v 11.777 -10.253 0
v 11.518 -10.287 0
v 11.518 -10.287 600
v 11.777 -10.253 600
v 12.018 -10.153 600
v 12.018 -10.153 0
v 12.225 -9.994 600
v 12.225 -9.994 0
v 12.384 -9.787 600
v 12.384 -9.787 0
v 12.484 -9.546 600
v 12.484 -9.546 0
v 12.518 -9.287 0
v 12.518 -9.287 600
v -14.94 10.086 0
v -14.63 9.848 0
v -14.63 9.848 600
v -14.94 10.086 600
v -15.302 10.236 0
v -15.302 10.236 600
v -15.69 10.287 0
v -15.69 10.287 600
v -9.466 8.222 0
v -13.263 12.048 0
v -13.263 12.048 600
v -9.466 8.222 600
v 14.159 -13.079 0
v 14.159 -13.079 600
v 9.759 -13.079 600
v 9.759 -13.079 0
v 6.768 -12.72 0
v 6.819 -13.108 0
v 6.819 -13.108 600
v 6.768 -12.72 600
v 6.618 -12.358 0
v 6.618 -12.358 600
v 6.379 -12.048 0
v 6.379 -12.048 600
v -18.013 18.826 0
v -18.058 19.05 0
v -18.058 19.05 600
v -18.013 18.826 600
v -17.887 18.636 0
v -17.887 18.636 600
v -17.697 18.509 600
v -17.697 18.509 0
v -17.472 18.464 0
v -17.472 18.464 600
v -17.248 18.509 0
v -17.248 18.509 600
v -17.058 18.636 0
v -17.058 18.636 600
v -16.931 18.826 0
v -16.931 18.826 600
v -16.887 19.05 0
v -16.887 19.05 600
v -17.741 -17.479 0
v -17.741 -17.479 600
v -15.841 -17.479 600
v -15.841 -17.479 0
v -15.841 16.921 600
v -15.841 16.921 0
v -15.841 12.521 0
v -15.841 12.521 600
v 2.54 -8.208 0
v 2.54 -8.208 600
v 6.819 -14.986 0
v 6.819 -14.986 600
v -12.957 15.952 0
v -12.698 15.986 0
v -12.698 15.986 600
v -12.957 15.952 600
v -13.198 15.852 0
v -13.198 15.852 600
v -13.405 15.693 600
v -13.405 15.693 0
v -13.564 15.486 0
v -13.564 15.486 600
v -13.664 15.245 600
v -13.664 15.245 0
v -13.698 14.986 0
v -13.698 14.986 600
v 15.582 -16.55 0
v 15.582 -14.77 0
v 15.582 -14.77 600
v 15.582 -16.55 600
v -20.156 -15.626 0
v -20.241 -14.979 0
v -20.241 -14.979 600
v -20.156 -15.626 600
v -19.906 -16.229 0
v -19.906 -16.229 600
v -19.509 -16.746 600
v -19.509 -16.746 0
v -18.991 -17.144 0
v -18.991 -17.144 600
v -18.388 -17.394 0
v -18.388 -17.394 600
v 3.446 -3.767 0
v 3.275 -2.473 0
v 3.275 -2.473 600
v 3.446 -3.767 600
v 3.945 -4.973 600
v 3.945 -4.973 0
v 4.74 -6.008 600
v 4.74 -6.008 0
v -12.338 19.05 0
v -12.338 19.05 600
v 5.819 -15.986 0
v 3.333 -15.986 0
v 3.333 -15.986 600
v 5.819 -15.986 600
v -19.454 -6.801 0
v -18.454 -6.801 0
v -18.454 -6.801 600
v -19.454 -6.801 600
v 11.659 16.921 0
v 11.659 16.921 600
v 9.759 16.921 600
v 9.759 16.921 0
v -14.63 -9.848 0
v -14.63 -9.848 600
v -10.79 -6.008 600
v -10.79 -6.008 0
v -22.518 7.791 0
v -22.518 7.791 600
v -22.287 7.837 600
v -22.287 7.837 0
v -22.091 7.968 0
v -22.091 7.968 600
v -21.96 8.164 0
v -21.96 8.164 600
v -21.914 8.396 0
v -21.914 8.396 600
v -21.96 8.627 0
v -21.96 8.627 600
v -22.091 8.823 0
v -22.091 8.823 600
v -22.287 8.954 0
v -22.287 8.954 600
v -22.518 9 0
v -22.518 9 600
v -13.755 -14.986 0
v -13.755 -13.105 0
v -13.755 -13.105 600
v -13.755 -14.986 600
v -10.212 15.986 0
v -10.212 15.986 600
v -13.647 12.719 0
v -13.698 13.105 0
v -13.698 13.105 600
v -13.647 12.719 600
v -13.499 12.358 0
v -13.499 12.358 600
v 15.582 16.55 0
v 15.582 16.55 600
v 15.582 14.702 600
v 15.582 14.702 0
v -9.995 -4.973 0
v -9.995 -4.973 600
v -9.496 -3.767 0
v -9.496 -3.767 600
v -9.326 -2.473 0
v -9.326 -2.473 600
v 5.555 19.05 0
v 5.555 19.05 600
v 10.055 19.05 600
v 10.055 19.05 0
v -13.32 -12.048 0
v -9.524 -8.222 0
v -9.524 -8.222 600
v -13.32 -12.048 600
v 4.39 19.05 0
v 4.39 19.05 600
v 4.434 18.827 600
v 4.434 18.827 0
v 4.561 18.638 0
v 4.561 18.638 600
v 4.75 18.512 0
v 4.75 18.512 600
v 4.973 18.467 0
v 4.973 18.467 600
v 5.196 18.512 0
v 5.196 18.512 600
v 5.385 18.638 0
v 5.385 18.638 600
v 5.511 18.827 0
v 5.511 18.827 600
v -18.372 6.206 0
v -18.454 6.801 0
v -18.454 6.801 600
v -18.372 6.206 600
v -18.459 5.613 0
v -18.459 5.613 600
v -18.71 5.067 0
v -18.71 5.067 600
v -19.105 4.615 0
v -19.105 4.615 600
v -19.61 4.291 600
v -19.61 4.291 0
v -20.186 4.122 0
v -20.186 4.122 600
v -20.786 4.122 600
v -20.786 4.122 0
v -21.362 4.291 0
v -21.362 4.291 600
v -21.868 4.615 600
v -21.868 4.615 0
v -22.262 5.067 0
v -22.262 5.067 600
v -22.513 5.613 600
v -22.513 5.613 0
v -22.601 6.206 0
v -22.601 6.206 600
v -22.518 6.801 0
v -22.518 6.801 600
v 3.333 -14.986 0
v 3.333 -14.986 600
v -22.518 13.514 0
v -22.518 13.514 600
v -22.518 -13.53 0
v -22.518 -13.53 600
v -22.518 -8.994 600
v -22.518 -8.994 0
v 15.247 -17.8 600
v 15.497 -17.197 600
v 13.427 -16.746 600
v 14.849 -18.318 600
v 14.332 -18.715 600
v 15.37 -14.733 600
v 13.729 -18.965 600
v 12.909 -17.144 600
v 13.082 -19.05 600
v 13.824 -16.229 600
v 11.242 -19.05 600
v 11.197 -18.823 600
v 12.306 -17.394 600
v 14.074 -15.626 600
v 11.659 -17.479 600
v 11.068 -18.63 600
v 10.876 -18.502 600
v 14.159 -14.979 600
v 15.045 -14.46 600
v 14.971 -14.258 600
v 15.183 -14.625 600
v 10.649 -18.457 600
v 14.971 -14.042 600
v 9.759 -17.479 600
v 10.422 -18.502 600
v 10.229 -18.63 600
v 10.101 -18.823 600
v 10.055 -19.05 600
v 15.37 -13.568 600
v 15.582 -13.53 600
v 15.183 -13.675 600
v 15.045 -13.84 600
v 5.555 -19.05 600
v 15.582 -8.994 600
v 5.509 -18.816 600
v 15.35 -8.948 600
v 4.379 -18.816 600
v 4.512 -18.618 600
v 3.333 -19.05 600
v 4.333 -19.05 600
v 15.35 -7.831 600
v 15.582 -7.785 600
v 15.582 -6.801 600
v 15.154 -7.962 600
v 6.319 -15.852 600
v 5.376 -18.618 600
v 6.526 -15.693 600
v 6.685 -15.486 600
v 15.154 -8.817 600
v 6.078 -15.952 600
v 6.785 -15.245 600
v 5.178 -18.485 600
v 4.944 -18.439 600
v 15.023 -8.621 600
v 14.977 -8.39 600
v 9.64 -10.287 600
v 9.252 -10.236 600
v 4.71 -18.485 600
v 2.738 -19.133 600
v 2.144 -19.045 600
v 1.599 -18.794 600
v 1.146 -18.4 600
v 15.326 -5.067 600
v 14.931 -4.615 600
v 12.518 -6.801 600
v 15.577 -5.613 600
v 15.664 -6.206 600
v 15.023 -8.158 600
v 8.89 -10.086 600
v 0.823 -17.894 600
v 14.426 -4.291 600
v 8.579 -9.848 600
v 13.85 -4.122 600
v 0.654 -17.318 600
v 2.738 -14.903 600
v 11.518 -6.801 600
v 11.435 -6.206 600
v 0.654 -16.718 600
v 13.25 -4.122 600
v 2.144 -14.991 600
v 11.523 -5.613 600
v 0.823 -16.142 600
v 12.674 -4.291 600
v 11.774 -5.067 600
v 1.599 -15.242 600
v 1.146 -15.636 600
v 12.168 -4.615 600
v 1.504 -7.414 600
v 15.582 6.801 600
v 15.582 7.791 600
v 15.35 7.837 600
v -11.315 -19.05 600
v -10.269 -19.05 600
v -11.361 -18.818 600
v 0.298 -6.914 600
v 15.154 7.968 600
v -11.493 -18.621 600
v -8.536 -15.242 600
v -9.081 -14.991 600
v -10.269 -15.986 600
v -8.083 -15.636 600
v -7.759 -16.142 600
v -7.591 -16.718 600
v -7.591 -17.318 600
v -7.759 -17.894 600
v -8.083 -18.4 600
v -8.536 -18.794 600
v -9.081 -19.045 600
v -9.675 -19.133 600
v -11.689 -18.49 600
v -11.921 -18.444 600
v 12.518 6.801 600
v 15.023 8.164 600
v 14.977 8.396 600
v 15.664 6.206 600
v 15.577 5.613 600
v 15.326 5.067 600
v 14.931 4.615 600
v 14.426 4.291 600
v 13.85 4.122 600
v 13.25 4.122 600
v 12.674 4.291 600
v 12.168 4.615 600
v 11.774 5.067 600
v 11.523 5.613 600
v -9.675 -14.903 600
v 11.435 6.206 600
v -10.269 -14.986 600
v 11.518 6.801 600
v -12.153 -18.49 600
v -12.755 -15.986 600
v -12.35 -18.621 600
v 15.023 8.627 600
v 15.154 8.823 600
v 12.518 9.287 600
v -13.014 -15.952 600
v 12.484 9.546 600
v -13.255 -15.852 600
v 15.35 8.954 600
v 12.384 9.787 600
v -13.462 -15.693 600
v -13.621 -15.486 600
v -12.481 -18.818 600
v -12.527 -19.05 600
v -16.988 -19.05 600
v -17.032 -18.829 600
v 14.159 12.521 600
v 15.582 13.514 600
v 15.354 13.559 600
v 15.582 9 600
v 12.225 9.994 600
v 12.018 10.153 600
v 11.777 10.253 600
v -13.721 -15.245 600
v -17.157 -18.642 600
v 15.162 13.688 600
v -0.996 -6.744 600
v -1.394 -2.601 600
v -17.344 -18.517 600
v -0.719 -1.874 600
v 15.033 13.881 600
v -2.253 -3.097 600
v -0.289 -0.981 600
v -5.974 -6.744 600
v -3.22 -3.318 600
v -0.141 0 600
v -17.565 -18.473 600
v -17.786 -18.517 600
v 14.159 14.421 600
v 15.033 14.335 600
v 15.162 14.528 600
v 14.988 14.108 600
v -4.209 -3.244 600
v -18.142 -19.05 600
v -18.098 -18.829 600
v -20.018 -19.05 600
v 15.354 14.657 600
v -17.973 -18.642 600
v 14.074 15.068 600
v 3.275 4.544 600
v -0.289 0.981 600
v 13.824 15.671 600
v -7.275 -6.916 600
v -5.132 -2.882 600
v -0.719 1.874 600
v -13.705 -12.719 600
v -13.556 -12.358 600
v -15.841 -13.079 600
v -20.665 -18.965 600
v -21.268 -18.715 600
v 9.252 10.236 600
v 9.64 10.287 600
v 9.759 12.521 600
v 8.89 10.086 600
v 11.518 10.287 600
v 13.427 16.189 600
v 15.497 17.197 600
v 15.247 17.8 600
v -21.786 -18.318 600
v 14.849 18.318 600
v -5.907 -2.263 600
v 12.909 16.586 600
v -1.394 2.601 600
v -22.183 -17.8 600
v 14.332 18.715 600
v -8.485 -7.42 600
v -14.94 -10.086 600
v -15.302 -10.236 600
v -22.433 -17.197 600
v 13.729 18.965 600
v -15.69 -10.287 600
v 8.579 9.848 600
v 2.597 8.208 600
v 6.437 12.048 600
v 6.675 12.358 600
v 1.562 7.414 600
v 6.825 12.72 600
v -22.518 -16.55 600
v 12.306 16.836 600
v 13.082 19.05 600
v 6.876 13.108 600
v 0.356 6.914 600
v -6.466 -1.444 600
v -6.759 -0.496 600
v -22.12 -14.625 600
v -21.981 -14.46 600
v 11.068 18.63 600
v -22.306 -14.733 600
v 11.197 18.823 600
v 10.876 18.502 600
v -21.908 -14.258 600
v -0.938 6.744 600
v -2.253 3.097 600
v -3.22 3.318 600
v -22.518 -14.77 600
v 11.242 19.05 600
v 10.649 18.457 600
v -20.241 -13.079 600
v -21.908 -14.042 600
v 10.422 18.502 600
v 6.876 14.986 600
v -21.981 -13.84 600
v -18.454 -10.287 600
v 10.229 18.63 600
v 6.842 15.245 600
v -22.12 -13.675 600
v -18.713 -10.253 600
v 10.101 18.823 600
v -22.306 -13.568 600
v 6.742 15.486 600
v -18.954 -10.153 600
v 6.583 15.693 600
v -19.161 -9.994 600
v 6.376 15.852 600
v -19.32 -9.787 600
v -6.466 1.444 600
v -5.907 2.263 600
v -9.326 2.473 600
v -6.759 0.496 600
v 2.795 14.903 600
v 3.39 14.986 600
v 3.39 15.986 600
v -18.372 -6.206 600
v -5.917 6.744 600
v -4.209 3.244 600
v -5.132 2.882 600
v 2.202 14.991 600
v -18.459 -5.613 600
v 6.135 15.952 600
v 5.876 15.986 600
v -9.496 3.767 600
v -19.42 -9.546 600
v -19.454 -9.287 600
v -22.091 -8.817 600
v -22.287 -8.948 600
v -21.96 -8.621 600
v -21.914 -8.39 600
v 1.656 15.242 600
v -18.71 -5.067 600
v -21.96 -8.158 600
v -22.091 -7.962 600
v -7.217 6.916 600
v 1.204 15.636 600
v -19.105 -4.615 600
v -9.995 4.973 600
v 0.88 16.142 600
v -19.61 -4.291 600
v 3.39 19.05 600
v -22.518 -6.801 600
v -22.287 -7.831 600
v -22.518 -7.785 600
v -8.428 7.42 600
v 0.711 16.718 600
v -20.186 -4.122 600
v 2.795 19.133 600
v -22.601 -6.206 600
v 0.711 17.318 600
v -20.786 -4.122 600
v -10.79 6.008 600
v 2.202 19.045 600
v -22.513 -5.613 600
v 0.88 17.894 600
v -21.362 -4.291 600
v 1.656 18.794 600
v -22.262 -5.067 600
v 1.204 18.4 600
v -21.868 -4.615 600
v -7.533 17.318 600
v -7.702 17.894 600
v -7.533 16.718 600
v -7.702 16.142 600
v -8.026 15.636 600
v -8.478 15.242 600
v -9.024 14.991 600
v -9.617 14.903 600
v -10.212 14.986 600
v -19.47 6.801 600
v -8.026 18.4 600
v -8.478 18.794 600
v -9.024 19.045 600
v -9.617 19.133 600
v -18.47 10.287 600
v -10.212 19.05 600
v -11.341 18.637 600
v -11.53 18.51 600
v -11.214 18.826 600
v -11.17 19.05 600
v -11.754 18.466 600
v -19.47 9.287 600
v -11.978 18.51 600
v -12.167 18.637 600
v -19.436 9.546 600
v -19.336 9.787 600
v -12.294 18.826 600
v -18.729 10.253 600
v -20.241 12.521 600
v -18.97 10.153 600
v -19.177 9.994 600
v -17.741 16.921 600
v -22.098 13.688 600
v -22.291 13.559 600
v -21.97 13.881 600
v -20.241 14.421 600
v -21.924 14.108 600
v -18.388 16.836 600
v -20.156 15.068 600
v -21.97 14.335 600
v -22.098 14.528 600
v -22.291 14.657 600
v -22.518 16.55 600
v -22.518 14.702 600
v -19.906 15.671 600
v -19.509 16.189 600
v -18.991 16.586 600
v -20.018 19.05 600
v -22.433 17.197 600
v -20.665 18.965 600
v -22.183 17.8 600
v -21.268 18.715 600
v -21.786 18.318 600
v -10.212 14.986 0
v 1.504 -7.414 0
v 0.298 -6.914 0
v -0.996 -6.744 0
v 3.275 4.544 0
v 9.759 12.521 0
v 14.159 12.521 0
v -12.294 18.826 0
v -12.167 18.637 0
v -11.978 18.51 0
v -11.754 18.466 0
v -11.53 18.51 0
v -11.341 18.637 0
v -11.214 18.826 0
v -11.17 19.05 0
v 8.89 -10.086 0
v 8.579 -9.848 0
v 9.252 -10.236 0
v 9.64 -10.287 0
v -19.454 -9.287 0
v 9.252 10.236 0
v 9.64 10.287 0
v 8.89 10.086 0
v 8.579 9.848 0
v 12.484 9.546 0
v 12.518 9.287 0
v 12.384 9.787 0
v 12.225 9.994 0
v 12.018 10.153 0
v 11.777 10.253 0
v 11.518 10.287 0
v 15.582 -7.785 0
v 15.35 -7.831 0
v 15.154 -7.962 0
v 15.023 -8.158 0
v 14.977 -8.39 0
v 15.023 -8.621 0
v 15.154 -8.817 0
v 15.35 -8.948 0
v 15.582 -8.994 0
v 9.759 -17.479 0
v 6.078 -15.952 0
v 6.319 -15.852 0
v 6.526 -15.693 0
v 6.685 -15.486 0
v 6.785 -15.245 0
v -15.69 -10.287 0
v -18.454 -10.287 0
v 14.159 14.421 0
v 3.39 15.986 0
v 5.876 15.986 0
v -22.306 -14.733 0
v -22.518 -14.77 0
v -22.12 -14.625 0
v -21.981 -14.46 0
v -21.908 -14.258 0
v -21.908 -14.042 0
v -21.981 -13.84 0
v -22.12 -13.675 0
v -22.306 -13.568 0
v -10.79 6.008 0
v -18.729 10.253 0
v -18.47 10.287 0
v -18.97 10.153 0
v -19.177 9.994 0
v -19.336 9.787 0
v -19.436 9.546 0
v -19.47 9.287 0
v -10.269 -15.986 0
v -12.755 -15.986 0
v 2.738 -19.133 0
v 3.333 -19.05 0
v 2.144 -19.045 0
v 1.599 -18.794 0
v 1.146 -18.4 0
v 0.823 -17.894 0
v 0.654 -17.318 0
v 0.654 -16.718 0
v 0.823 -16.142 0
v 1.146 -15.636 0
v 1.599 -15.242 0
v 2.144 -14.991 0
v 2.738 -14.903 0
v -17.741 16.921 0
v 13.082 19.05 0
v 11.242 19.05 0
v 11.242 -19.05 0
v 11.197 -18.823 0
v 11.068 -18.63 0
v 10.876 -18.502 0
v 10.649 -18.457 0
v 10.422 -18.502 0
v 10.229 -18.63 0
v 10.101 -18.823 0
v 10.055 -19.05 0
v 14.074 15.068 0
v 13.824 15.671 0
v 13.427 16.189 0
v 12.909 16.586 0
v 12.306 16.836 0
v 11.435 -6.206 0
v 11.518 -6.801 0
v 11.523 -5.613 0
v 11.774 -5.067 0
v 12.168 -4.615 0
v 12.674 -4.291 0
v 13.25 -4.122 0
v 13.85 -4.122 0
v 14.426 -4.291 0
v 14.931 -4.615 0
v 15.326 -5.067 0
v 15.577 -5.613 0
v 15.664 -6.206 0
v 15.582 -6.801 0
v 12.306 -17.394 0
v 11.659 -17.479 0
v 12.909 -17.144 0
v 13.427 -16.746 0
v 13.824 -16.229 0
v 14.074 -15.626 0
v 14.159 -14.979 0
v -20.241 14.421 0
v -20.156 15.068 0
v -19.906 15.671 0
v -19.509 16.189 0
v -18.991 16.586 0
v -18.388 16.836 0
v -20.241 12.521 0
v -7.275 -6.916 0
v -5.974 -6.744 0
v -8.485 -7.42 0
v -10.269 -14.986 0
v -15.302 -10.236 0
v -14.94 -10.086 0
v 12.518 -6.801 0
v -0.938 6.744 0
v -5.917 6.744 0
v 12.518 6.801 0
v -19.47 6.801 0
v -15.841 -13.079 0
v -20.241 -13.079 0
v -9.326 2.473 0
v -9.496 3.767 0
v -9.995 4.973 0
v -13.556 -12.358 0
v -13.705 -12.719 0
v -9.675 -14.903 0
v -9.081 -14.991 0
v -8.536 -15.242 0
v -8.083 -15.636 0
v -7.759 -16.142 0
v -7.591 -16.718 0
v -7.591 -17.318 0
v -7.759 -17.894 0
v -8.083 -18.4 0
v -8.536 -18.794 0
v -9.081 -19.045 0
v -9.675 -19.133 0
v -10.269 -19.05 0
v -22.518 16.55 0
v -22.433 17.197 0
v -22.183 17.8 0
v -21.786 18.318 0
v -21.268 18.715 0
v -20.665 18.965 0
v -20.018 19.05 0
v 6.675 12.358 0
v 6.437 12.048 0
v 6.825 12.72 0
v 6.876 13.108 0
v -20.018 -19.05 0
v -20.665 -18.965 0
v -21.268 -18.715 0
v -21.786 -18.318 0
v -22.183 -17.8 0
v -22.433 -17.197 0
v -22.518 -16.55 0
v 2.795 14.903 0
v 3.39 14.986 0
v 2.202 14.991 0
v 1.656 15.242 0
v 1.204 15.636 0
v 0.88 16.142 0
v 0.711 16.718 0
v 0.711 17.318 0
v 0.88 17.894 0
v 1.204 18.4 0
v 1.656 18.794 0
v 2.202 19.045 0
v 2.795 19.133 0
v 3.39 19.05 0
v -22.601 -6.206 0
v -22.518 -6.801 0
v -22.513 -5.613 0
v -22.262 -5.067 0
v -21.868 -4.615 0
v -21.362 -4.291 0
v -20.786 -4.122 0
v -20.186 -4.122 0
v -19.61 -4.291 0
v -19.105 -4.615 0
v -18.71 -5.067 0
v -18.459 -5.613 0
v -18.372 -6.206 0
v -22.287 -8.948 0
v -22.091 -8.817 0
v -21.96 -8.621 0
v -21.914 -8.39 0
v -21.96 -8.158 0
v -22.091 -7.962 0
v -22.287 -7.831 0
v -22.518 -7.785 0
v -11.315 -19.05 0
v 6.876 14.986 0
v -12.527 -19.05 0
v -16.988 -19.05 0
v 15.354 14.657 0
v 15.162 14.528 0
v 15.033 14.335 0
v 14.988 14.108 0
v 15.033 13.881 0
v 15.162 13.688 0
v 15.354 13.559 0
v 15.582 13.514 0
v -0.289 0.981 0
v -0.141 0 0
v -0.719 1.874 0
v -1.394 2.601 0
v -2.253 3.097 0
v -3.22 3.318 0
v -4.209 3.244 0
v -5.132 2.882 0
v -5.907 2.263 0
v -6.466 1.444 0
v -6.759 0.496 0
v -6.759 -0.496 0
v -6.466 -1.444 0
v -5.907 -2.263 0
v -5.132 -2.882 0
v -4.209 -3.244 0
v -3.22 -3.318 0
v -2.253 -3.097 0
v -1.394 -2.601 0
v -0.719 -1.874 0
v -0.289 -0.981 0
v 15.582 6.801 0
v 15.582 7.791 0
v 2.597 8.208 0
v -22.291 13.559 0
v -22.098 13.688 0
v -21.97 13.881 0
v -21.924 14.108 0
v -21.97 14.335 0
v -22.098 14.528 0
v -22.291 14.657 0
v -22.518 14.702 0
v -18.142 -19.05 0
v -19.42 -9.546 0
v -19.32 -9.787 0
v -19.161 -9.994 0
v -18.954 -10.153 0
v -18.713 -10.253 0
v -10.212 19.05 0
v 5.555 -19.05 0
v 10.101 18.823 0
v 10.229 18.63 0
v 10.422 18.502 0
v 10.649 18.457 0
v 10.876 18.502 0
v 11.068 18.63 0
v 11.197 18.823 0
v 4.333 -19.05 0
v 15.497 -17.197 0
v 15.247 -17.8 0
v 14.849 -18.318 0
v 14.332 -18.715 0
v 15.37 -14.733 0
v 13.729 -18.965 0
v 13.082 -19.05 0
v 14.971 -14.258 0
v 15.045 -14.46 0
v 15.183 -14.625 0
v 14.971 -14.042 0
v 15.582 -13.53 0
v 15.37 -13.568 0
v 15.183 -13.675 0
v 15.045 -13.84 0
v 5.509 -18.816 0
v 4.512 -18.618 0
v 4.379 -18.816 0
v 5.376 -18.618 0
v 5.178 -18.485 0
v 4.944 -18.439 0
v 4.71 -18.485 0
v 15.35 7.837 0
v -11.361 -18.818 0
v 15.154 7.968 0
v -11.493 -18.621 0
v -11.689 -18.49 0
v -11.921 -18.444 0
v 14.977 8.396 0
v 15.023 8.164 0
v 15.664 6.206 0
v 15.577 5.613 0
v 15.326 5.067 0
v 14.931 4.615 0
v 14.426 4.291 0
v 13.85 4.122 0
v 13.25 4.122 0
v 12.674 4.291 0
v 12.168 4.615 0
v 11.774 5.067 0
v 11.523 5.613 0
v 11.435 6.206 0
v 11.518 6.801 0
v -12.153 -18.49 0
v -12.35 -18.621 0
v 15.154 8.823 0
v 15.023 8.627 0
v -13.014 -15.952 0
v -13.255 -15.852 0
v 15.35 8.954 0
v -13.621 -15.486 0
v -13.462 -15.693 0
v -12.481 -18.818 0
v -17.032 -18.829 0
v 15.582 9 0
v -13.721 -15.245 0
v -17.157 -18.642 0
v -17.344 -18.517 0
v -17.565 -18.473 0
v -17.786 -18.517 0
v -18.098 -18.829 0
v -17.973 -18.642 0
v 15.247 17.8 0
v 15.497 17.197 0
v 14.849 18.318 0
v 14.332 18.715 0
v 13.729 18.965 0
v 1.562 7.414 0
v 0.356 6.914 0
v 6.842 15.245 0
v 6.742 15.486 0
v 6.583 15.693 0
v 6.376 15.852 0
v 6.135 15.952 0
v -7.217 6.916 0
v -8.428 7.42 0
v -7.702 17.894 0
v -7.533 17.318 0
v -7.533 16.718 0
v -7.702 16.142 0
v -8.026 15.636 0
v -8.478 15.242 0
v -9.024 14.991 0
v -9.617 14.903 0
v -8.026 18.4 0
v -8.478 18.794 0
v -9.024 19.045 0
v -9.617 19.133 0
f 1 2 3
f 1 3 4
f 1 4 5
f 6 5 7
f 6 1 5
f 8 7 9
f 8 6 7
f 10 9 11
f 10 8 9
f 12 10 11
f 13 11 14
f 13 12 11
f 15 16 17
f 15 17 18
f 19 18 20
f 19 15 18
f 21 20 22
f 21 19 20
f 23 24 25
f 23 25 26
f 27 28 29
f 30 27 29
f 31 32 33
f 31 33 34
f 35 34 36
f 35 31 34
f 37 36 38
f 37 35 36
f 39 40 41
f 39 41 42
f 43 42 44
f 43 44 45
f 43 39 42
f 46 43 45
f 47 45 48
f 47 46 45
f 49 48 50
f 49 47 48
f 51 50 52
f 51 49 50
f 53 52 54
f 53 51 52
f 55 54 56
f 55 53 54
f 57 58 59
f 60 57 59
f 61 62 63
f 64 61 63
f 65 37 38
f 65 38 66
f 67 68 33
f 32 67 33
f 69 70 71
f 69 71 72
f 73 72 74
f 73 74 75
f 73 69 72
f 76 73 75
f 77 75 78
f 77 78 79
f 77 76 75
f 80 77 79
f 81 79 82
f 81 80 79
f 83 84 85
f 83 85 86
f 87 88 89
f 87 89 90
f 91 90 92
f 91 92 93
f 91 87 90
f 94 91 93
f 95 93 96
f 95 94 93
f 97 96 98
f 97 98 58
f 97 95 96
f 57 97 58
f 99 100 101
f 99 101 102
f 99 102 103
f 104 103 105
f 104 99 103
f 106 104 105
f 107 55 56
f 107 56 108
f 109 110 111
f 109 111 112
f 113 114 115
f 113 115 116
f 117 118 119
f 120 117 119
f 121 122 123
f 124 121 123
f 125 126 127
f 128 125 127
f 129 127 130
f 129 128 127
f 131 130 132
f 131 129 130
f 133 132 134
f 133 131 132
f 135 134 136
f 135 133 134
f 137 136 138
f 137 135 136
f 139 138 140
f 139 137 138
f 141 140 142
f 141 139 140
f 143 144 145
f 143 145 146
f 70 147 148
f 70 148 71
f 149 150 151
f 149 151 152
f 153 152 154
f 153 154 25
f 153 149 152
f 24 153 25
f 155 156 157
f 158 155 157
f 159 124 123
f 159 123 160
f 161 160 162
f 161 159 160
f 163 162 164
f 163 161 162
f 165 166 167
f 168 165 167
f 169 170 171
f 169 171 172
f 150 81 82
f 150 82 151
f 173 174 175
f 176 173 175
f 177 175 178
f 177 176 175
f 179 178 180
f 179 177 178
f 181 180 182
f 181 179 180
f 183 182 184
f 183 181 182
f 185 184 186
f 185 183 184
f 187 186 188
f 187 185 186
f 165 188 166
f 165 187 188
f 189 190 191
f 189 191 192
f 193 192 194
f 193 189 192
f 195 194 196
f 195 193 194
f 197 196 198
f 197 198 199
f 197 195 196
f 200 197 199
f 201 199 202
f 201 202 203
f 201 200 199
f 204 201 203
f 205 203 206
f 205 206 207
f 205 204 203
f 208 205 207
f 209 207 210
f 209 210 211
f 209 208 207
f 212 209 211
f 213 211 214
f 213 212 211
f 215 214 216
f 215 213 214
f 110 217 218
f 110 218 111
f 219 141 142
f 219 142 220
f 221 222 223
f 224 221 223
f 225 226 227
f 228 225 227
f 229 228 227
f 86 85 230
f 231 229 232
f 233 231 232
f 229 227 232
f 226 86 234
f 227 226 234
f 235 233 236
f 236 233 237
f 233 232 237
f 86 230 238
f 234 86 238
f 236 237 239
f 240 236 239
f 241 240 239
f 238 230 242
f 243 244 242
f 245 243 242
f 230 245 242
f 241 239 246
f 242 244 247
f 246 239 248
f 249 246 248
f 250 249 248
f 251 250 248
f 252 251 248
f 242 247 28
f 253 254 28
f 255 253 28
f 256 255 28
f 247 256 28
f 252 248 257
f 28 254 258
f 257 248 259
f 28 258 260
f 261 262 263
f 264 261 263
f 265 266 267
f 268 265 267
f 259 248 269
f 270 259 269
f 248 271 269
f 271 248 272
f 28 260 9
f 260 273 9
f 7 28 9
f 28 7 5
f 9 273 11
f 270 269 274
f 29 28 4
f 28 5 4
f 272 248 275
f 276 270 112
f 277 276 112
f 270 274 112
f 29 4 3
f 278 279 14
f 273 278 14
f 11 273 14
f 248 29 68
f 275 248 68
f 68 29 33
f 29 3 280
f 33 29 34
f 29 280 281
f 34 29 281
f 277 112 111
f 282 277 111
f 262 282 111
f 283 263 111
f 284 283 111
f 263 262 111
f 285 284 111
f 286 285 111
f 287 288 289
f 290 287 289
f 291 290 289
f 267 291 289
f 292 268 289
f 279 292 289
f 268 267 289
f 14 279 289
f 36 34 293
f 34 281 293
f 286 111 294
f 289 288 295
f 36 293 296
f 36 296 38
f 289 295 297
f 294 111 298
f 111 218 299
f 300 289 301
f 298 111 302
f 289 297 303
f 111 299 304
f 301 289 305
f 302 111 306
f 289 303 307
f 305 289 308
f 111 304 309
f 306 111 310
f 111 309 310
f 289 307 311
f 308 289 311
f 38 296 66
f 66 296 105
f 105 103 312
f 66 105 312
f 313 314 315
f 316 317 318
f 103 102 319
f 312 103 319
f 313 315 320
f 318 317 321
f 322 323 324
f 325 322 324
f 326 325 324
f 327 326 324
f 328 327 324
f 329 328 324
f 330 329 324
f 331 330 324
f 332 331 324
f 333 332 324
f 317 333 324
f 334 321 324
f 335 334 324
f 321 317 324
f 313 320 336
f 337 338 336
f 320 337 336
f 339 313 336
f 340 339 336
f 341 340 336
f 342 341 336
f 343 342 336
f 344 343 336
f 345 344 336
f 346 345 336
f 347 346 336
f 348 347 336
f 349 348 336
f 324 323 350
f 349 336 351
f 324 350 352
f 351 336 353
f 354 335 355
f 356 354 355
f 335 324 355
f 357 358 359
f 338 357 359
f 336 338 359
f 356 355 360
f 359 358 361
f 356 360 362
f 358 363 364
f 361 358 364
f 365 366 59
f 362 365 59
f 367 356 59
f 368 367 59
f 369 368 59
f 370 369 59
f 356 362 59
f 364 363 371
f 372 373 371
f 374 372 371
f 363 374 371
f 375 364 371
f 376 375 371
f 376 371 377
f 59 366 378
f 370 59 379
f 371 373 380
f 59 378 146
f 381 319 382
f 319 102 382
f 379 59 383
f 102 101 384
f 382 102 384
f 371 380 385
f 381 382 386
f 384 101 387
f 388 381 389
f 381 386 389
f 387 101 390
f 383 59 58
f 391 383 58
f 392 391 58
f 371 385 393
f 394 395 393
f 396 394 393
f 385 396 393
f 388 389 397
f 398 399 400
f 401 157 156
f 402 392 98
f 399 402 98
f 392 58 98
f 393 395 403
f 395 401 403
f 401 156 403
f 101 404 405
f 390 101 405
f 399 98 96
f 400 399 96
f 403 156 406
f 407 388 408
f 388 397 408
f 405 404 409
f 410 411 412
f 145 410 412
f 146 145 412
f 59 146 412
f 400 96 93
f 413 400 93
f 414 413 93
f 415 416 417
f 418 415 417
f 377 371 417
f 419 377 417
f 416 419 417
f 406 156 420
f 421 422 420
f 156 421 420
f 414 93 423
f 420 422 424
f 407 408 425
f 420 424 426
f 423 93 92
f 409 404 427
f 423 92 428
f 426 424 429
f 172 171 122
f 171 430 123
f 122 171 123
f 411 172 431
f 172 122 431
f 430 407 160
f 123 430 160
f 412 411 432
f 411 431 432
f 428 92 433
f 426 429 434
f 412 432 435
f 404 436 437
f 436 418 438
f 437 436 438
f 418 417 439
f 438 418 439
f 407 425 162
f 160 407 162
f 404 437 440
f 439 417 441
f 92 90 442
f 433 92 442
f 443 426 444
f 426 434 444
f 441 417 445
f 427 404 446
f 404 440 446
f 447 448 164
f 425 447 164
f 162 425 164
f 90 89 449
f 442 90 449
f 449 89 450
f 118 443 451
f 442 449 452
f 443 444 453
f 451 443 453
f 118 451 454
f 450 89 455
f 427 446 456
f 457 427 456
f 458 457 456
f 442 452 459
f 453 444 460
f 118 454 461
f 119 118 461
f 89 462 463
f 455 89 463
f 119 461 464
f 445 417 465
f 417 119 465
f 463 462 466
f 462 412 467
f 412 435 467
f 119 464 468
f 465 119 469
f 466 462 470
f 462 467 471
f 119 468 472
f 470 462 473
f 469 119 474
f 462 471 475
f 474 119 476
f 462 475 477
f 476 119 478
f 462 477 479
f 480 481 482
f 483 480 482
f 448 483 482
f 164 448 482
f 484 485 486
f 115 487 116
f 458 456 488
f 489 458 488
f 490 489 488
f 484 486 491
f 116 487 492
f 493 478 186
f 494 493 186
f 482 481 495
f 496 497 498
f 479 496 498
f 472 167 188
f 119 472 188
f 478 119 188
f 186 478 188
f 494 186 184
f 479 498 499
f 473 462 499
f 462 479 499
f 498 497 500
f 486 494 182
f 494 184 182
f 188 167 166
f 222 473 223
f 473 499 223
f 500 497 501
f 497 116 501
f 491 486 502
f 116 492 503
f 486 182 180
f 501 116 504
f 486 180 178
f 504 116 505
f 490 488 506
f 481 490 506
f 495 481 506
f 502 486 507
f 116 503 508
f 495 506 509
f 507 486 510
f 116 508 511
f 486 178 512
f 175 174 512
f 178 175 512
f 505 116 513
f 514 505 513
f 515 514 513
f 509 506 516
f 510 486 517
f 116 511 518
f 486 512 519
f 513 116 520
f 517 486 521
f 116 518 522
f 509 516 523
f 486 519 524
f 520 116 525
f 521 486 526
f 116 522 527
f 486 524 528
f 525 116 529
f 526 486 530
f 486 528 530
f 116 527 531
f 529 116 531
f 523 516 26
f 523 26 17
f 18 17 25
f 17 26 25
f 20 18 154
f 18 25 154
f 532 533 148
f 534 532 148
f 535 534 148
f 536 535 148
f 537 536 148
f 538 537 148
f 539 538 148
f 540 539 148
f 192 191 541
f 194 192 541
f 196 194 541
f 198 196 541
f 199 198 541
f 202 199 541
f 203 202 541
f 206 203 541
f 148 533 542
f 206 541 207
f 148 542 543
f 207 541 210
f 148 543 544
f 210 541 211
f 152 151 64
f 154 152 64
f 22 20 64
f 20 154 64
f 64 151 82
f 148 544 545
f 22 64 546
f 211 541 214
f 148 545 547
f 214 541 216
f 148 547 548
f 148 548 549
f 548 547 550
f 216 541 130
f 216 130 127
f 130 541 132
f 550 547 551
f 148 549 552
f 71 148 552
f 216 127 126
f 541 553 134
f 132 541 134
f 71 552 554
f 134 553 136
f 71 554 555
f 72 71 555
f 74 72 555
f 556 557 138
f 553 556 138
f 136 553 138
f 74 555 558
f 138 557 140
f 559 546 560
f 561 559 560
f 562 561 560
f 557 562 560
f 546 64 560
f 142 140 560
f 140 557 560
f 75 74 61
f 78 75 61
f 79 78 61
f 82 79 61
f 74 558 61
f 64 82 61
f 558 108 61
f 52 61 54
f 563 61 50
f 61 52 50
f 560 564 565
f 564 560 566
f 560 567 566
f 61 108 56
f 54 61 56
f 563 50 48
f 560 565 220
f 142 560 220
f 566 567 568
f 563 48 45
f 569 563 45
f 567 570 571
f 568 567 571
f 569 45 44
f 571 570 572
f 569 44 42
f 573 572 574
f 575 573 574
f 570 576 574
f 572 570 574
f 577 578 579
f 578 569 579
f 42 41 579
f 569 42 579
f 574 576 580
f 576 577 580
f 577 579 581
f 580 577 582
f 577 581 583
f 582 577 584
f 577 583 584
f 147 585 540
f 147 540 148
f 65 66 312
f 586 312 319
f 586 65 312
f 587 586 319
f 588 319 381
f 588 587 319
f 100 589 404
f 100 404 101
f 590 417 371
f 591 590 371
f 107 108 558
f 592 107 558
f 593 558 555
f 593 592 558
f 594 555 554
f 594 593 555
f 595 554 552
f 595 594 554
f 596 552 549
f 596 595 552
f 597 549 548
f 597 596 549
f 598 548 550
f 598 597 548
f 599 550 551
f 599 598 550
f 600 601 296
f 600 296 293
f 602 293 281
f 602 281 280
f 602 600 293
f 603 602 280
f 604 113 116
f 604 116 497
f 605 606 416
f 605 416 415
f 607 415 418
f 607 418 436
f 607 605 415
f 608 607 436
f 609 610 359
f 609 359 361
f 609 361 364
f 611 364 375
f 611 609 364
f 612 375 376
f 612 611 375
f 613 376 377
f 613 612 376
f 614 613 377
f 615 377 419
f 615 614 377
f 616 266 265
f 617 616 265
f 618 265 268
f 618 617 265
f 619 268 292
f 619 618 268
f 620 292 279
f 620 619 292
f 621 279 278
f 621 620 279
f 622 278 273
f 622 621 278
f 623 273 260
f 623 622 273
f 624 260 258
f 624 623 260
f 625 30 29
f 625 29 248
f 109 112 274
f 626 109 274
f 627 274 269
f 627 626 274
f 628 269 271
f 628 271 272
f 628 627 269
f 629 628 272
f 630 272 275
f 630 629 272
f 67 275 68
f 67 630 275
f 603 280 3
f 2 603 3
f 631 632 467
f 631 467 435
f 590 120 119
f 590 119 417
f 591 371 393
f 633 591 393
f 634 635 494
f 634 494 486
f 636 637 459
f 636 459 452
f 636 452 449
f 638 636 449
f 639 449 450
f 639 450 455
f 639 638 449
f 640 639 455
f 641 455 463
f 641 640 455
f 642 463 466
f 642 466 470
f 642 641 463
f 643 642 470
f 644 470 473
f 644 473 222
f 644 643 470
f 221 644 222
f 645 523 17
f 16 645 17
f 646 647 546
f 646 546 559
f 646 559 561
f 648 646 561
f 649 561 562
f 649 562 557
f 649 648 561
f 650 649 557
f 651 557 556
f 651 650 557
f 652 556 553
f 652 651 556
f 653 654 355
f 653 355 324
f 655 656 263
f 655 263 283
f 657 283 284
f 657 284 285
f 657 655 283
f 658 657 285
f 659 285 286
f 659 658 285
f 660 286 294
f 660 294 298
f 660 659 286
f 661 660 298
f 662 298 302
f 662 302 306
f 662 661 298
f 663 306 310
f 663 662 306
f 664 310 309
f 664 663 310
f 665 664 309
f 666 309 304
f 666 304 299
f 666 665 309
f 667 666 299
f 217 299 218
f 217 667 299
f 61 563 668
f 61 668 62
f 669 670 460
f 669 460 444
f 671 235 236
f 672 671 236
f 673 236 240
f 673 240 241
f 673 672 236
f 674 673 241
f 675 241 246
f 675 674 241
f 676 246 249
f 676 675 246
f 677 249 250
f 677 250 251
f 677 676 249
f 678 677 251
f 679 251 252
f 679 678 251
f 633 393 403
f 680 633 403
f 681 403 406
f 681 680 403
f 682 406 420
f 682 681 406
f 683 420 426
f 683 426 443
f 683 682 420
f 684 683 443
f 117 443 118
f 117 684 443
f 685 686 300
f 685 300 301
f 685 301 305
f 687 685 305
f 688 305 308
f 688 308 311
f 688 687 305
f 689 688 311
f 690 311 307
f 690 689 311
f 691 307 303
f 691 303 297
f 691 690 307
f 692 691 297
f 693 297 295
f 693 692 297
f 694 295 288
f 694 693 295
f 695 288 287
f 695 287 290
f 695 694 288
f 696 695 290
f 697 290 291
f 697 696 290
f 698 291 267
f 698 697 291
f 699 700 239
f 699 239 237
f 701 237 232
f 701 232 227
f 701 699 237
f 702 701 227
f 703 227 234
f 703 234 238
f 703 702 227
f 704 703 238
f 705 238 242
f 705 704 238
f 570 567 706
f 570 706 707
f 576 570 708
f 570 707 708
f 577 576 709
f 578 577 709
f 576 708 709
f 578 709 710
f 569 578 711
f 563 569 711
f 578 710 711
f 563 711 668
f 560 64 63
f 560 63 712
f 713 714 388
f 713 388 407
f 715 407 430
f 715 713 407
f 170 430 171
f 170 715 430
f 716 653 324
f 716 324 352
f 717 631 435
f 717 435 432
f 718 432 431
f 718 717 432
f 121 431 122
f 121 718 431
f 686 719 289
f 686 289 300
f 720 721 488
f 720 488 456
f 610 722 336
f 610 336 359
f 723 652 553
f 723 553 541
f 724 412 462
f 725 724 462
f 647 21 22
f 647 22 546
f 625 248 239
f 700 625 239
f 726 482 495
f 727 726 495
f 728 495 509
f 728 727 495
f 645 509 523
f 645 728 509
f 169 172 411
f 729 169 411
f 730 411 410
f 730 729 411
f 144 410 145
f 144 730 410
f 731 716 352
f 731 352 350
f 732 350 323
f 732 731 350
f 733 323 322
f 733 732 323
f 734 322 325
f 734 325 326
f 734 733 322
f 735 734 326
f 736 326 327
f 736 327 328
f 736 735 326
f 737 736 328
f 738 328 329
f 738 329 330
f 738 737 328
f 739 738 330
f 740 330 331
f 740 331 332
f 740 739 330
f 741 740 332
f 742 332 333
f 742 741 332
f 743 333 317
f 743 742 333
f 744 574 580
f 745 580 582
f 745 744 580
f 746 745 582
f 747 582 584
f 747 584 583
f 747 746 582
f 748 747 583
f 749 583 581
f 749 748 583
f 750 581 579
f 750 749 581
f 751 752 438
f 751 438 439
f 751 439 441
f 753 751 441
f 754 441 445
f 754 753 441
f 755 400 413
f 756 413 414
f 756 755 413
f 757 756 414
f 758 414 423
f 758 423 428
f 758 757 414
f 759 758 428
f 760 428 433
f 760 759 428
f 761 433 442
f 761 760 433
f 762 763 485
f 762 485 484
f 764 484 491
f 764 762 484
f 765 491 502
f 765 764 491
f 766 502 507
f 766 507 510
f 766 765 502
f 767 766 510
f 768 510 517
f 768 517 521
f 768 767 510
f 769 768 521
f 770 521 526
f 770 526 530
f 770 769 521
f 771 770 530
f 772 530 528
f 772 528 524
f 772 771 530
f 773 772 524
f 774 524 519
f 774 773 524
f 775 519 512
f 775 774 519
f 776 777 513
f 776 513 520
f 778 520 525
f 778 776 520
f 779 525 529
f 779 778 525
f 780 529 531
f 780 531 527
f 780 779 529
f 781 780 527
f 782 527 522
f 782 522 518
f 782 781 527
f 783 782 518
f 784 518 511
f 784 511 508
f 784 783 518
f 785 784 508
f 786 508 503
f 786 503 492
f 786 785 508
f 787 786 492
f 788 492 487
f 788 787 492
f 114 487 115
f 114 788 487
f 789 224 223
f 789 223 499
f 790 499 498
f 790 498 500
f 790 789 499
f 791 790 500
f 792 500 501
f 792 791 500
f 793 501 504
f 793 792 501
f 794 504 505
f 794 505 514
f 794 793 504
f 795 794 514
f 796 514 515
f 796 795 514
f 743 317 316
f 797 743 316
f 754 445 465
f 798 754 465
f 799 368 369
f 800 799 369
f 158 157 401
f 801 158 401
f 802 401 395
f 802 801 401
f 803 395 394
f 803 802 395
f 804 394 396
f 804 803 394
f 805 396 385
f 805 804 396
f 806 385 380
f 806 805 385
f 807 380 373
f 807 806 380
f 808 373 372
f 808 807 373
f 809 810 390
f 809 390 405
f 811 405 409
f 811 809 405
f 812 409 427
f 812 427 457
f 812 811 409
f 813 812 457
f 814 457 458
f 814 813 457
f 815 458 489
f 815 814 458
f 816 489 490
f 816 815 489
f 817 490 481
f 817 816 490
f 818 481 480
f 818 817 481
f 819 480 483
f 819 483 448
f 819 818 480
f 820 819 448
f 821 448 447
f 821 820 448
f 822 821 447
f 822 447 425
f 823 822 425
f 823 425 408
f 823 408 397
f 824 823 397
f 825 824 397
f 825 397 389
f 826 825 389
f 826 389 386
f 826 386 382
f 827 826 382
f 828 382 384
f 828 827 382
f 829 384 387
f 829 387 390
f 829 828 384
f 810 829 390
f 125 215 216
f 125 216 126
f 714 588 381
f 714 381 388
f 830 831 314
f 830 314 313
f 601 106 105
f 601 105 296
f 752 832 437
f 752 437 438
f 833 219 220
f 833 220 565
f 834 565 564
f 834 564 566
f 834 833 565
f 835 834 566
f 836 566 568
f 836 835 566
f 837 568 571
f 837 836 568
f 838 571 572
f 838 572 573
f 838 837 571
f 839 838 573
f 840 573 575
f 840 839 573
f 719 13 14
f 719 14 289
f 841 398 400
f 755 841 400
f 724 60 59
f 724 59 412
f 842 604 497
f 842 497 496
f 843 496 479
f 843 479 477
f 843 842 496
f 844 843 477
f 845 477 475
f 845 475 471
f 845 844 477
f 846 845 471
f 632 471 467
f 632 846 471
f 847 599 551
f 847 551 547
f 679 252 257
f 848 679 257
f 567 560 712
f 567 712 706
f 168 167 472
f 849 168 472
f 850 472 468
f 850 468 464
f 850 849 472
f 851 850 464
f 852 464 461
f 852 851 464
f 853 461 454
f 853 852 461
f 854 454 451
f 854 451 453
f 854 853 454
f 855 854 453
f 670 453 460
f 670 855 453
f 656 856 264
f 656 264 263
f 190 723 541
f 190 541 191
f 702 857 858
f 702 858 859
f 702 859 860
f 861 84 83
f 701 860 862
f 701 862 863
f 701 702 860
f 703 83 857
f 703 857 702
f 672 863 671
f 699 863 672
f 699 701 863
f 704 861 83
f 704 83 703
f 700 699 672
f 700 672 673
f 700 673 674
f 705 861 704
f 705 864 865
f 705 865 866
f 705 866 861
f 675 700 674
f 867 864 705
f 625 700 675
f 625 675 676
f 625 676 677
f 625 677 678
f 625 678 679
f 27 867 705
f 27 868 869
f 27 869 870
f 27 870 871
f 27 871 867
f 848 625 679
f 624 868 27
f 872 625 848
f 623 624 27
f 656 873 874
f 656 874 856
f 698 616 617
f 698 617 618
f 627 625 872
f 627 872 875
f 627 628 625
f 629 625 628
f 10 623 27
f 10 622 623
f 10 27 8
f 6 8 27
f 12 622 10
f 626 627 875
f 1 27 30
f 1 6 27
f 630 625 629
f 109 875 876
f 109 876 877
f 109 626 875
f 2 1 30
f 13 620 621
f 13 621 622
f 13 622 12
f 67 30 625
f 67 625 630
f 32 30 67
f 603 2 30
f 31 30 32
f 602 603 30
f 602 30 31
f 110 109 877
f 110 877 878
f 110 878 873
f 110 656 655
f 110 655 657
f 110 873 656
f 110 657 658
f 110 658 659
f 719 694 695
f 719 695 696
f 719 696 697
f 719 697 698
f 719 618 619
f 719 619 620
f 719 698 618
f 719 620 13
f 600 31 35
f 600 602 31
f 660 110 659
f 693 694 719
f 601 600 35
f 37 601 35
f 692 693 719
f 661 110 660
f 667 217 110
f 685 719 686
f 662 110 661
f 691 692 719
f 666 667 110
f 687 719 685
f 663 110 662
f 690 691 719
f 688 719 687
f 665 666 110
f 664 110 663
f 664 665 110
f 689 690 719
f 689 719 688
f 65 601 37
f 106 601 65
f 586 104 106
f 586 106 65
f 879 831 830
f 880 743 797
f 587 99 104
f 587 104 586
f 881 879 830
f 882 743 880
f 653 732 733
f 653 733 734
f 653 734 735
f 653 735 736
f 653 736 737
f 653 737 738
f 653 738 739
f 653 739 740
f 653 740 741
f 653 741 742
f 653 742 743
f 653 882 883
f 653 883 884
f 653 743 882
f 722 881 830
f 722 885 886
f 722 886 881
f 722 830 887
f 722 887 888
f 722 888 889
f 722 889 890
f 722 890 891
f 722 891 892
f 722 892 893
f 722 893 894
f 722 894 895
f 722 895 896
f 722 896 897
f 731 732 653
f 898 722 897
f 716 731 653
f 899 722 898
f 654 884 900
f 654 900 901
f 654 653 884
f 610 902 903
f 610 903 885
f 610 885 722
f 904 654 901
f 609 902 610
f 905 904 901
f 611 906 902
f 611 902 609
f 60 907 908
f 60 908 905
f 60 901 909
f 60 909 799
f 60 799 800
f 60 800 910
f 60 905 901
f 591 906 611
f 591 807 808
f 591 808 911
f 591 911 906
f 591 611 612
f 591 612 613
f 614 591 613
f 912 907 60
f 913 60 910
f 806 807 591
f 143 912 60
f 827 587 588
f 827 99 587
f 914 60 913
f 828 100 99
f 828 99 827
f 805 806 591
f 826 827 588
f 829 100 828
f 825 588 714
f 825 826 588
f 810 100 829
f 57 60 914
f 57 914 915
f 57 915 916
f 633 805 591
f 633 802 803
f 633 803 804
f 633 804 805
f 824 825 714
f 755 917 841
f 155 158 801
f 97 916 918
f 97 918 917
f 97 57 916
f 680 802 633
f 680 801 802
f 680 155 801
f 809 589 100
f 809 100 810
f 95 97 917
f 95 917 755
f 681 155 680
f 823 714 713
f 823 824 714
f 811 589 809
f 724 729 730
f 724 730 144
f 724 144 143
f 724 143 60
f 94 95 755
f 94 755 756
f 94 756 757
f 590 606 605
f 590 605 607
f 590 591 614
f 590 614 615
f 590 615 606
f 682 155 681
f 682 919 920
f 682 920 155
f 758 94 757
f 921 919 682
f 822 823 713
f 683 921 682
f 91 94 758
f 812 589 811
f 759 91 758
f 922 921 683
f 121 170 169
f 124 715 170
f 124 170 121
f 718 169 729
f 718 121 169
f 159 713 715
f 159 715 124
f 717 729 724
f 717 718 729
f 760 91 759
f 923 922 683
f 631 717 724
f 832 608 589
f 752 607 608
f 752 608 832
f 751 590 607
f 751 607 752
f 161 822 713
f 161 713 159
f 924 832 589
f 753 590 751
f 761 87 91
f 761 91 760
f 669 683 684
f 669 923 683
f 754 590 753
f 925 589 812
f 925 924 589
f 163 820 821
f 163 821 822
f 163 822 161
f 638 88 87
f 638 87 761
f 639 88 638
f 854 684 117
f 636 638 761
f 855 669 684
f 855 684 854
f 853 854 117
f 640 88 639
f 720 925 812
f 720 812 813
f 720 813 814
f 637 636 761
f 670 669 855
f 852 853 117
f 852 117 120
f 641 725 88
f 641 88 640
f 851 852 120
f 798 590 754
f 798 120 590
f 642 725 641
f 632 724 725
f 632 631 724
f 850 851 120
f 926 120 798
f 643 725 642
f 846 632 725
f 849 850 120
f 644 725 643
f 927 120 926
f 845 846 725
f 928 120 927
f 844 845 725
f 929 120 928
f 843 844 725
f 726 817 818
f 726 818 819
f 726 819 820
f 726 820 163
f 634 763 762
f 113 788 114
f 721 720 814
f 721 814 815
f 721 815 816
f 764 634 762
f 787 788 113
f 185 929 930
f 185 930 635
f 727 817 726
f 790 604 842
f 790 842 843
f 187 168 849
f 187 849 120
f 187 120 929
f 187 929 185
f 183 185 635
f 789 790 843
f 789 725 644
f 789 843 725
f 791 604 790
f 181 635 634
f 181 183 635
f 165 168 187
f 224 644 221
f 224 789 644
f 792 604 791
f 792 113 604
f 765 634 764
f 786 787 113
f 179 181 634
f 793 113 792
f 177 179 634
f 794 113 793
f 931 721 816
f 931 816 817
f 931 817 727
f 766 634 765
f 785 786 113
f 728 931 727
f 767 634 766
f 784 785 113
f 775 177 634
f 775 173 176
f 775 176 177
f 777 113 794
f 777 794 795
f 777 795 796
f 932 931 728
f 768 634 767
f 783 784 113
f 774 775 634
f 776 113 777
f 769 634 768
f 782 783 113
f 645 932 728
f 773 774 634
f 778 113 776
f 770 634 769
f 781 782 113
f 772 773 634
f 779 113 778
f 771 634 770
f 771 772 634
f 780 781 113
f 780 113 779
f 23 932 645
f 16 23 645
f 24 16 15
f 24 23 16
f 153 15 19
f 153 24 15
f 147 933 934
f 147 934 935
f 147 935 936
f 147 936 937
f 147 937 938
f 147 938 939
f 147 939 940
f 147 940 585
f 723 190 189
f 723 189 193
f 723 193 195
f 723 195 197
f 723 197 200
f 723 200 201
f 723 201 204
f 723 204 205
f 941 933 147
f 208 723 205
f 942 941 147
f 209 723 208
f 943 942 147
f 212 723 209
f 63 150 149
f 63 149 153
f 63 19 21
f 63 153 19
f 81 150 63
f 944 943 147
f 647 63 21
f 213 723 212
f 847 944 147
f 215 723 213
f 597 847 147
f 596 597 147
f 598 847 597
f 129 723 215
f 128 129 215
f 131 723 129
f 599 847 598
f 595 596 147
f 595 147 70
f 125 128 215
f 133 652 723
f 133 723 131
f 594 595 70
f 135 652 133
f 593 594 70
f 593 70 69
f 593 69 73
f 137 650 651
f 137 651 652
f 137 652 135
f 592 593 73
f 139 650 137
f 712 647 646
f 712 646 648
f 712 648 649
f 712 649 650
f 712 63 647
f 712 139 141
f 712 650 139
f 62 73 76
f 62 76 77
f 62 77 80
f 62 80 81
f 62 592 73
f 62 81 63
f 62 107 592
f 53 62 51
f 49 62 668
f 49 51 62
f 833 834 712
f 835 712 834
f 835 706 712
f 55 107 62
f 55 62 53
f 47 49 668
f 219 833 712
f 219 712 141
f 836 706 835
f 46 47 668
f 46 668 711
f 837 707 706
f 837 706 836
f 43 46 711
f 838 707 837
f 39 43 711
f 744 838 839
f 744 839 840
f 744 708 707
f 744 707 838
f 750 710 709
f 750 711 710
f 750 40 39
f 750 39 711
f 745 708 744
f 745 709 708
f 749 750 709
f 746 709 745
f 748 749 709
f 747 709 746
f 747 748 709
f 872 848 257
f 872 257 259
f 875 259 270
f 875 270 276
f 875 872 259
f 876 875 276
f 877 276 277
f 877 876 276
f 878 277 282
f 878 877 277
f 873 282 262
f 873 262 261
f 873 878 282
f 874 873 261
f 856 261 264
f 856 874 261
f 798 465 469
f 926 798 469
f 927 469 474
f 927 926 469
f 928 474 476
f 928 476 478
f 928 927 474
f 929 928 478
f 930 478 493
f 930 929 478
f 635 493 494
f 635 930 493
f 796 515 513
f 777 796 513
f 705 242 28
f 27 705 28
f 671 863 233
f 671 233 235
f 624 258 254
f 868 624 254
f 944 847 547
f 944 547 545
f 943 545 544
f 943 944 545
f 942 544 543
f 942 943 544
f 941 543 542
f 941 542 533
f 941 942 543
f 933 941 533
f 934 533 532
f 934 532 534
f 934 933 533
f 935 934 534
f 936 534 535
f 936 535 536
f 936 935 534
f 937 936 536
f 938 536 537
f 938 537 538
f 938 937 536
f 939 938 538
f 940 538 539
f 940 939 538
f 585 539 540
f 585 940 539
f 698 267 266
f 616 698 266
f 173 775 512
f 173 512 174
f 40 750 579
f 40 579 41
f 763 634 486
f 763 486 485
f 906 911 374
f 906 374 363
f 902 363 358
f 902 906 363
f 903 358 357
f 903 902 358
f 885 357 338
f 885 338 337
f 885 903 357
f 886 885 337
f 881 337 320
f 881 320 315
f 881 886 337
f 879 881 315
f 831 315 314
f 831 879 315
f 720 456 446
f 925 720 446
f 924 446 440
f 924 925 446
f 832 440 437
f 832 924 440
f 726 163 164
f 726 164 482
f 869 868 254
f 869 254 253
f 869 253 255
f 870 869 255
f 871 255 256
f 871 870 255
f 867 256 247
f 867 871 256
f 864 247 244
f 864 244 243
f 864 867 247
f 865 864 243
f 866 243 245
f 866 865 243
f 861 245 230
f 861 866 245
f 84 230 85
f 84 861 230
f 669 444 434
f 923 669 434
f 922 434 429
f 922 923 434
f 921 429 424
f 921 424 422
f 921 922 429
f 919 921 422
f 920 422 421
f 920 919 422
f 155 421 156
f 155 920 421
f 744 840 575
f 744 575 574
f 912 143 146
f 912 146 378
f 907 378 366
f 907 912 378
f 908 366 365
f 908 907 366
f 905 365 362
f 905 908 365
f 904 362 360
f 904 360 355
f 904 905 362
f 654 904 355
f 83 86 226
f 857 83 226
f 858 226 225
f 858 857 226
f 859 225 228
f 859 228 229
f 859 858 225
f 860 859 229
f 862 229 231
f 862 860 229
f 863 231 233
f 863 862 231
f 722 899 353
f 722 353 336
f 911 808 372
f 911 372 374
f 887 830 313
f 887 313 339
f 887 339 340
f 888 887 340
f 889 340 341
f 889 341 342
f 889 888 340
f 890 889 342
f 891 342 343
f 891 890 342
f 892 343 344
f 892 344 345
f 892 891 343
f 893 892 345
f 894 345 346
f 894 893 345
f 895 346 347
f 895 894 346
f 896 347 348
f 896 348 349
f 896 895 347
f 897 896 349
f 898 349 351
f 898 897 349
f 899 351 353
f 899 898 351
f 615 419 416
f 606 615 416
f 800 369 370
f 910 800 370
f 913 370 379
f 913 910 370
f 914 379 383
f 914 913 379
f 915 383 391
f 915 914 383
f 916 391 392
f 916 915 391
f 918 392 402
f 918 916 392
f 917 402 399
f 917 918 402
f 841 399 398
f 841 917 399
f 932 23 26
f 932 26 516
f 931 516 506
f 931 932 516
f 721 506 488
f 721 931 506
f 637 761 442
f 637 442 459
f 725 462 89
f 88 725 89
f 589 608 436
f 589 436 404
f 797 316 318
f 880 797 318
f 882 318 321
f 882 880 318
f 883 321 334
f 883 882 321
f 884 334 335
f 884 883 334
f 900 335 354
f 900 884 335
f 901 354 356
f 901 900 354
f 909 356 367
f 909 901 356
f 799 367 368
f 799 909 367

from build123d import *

# Parameters (mm, degrees)
SKETCH1_R           = 3.3274
BOSS_EXTRUDE1_DEPTH = 600


with BuildPart() as part:
    # Sketch1 → Boss-Extrude1 (new body)
    with BuildSketch(Plane.XY):
        with BuildLine():
            Line((-13.26278249, 12.048382599), (-9.466223312, 8.222017216))
            ThreePointArc((-9.466223312, 8.222017216), (-7.839336885, 7.128051946), (-5.916892336, 6.7437))
            Line((-5.916892336, 6.7437), (-0.938351009, 6.7437))
            ThreePointArc((-0.938351009, 6.7437), (0.975066153, 7.124302337), (2.597182897, 8.208166094))
            Line((2.597182897, 8.208166094), (6.436676974, 12.047660172))
            ThreePointArc((6.436676974, 12.047660172), (6.761836101, 12.534295195), (6.876016803, 13.108320344))
            Line((6.876016803, 13.108320344), (6.876016803, 14.986))
            ThreePointArc((6.876016803, 14.986), (6.583123584, 15.693106781), (5.876016803, 15.986))
            Line((5.876016803, 15.986), (3.390016803, 15.986))
            Line((3.390016803, 15.986), (3.390016803, 14.986))
            ThreePointArc((3.390016803, 14.986), (0.690016803, 17.018), (3.390016803, 19.05))
            Line((3.390016803, 19.05), (4.390016803, 19.05))
            ThreePointArc((4.390016803, 19.05), (4.972748366, 18.467268437), (5.555479929, 19.05))
            Line((5.555479929, 19.05), (10.055479929, 19.05))
            ThreePointArc((10.055479929, 19.05), (10.648750347, 18.456729582), (11.242020765, 19.05))
            Line((11.242020765, 19.05), (13.081716803, 19.05))
            ThreePointArc((13.081716803, 19.05), (14.849483756, 18.317766953), (15.581716803, 16.55))
            Line((15.581716803, 16.55), (15.581716803, 14.701887799))
            ThreePointArc((15.581716803, 14.701887799), (14.98781258, 14.107983576), (15.581716803, 13.514079353))
            Line((15.581716803, 13.514079353), (15.581716803, 9.000407261))
            ThreePointArc((15.581716803, 9.000407261), (14.977014321, 8.39570478), (15.581716803, 7.791002299))
            Line((15.581716803, 7.791002299), (15.581716803, 6.801))
            ThreePointArc((15.581716803, 6.801), (13.549716803, 4.101), (11.517716803, 6.801))
            Line((11.517716803, 6.801), (12.517716803, 6.801))
            Line((12.517716803, 6.801), (12.517716803, 9.287))
            ThreePointArc((12.517716803, 9.287), (12.224823584, 9.994106781), (11.517716803, 10.287))
            Line((11.517716803, 10.287), (9.640037146, 10.287))
            ThreePointArc((9.640037146, 10.287), (9.066011998, 10.172819299), (8.579376974, 9.847660172))
            Line((8.579376974, 9.847660172), (3.275416803, 4.5437))
            Line((3.275416803, 4.5437), (3.275416803, -2.472632188))
            ThreePointArc((3.275416803, -2.472632188), (3.65601914, -4.38604935), (4.739882897, -6.008166094))
            Line((4.739882897, -6.008166094), (8.579376974, -9.847660172))
            ThreePointArc((8.579376974, -9.847660172), (9.066011998, -10.172819299), (9.640037146, -10.287))
            Line((9.640037146, -10.287), (11.517716803, -10.287))
            ThreePointArc((11.517716803, -10.287), (12.224823584, -9.994106781), (12.517716803, -9.287))
            Line((12.517716803, -9.287), (12.517716803, -6.801))
            Line((12.517716803, -6.801), (11.517716803, -6.801))
            ThreePointArc((11.517716803, -6.801), (13.549716803, -4.101), (15.581716803, -6.801))
            Line((15.581716803, -6.801), (15.581716803, -7.784900507))
            ThreePointArc((15.581716803, -7.784900507), (14.976944942, -8.389672368), (15.581716803, -8.994444229))
            Line((15.581716803, -8.994444229), (15.581716803, -13.530233187))
            ThreePointArc((15.581716803, -13.530233187), (14.961825645, -14.150124345), (15.581716803, -14.770015502))
            Line((15.581716803, -14.770015502), (15.581716803, -16.55))
            ThreePointArc((15.581716803, -16.55), (14.849483756, -18.317766953), (13.081716803, -19.05))
            Line((13.081716803, -19.05), (11.242020765, -19.05))
            ThreePointArc((11.242020765, -19.05), (10.648750347, -18.456729582), (10.055479929, -19.05))
            Line((10.055479929, -19.05), (5.555479929, -19.05))
            ThreePointArc((5.555479929, -19.05), (4.944098366, -18.438618437), (4.332716803, -19.05))
            Line((4.332716803, -19.05), (3.332716803, -19.05))
            ThreePointArc((3.332716803, -19.05), (0.632716803, -17.018), (3.332716803, -14.986))
            Line((3.332716803, -14.986), (3.332716803, -15.986))
            Line((3.332716803, -15.986), (5.818716803, -15.986))
            ThreePointArc((5.818716803, -15.986), (6.525823584, -15.693106781), (6.818716803, -14.986))
            Line((6.818716803, -14.986), (6.818716803, -13.108320344))
            ThreePointArc((6.818716803, -13.108320344), (6.704536101, -12.534295195), (6.379376974, -12.047660172))
            Line((6.379376974, -12.047660172), (2.539882897, -8.208166094))
            ThreePointArc((2.539882897, -8.208166094), (0.917766153, -7.124302337), (-0.995651009, -6.7437))
            Line((-0.995651009, -6.7437), (-5.974192336, -6.7437))
            ThreePointArc((-5.974192336, -6.7437), (-7.896636885, -7.128051946), (-9.523523312, -8.222017216))
            Line((-9.523523312, -8.222017216), (-13.32008249, -12.048382599))
            ThreePointArc((-13.32008249, -12.048382599), (-13.642222082, -12.533572695), (-13.755283197, -13.104887434))
            Line((-13.755283197, -13.104887434), (-13.755283197, -14.986))
            ThreePointArc((-13.755283197, -14.986), (-13.462389979, -15.693106781), (-12.755283197, -15.986))
            Line((-12.755283197, -15.986), (-10.269283197, -15.986))
            Line((-10.269283197, -15.986), (-10.269283197, -14.986))
            ThreePointArc((-10.269283197, -14.986), (-7.569283197, -17.018), (-10.269283197, -19.05))
            Line((-10.269283197, -19.05), (-11.315016833, -19.05))
            ThreePointArc((-11.315016833, -19.05), (-11.921258393, -18.44375844), (-12.527499953, -19.05))
            Line((-12.527499953, -19.05), (-16.98793888, -19.05))
            ThreePointArc((-16.98793888, -19.05), (-17.564834103, -18.473104777), (-18.141729326, -19.05))
            Line((-18.141729326, -19.05), (-20.018283197, -19.05))
            ThreePointArc((-20.018283197, -19.05), (-21.78605015, -18.317766953), (-22.518283197, -16.55))
            Line((-22.518283197, -16.55), (-22.518283197, -14.770015502))
            ThreePointArc((-22.518283197, -14.770015502), (-21.89839204, -14.150124345), (-22.518283197, -13.530233187))
            Line((-22.518283197, -13.530233187), (-22.518283197, -8.994444229))
            ThreePointArc((-22.518283197, -8.994444229), (-21.913511336, -8.389672368), (-22.518283197, -7.784900507))
            Line((-22.518283197, -7.784900507), (-22.518283197, -6.801))
            ThreePointArc((-22.518283197, -6.801), (-20.486283197, -4.101), (-18.454283197, -6.801))
            Line((-18.454283197, -6.801), (-19.454283197, -6.801))
            Line((-19.454283197, -6.801), (-19.454283197, -9.287))
            ThreePointArc((-19.454283197, -9.287), (-19.161389979, -9.994106781), (-18.454283197, -10.287))
            Line((-18.454283197, -10.287), (-15.690222352, -10.287))
            ThreePointArc((-15.690222352, -10.287), (-15.116197203, -10.172819299), (-14.62956218, -9.847660172))
            Line((-14.62956218, -9.847660172), (-10.790068102, -6.008166094))
            ThreePointArc((-10.790068102, -6.008166094), (-9.706204346, -4.38604935), (-9.325602008, -2.472632188))
            Line((-9.325602008, -2.472632188), (-9.325602008, 2.472632188))
            ThreePointArc((-9.325602008, 2.472632188), (-9.706204346, 4.38604935), (-10.790068102, 6.008166094))
            Line((-10.790068102, 6.008166094), (-14.62956218, 9.847660172))
            ThreePointArc((-14.62956218, 9.847660172), (-15.116197203, 10.172819299), (-15.690222352, 10.287))
            Line((-15.690222352, 10.287), (-18.470283197, 10.287))
            ThreePointArc((-18.470283197, 10.287), (-19.177389979, 9.994106781), (-19.470283197, 9.287))
            Line((-19.470283197, 9.287), (-19.470283197, 6.801))
            Line((-19.470283197, 6.801), (-18.454283197, 6.801))
            ThreePointArc((-18.454283197, 6.801), (-20.486283197, 4.101), (-22.518283197, 6.801))
            Line((-22.518283197, 6.801), (-22.518283197, 7.791002299))
            ThreePointArc((-22.518283197, 7.791002299), (-21.913580716, 8.39570478), (-22.518283197, 9.000407261))
            Line((-22.518283197, 9.000407261), (-22.518283197, 13.514079353))
            ThreePointArc((-22.518283197, 13.514079353), (-21.924378975, 14.107983576), (-22.518283197, 14.701887799))
            Line((-22.518283197, 14.701887799), (-22.518283197, 16.55))
            ThreePointArc((-22.518283197, 16.55), (-21.78605015, 18.317766953), (-20.018283197, 19.05))
            Line((-20.018283197, 19.05), (-18.058059148, 19.05))
            ThreePointArc((-18.058059148, 19.05), (-17.472421173, 18.464362025), (-16.886783197, 19.05))
            Line((-16.886783197, 19.05), (-12.338361419, 19.05))
            ThreePointArc((-12.338361419, 19.05), (-11.7540173, 18.465655881), (-11.169673181, 19.05))
            Line((-11.169673181, 19.05), (-10.211983197, 19.05))
            ThreePointArc((-10.211983197, 19.05), (-7.511983197, 17.018), (-10.211983197, 14.986))
            Line((-10.211983197, 14.986), (-10.211983197, 15.986))
            Line((-10.211983197, 15.986), (-12.697983197, 15.986))
            ThreePointArc((-12.697983197, 15.986), (-13.405089979, 15.693106781), (-13.697983197, 14.986))
            Line((-13.697983197, 14.986), (-13.697983197, 13.104887434))
            ThreePointArc((-13.697983197, 13.104887434), (-13.584922082, 12.533572695), (-13.26278249, 12.048382599))
        make_face()
        with Locations((-3.468283197, 0)):
            Circle(SKETCH1_R, mode=Mode.SUBTRACT)
        with BuildLine():
            Line((14.158897896, 12.521284057), (14.158897896, 14.421284057))
            ThreePointArc((14.158897896, 14.421284057), (13.426664849, 16.189051009), (11.658897896, 16.921284057))
            Line((11.658897896, 16.921284057), (9.758897896, 16.921284057))
            Line((9.758897896, 16.921284057), (9.758897896, 12.521284057))
            Line((9.758897896, 12.521284057), (14.158897896, 12.521284057))
        make_face(mode=Mode.SUBTRACT)
        with BuildLine():
            Line((-15.841102104, 12.521284057), (-20.241102104, 12.521284057))
            Line((-20.241102104, 12.521284057), (-20.241102104, 14.421284057))
            ThreePointArc((-20.241102104, 14.421284057), (-19.508869057, 16.189051009), (-17.741102104, 16.921284057))
            Line((-17.741102104, 16.921284057), (-15.841102104, 16.921284057))
            Line((-15.841102104, 16.921284057), (-15.841102104, 12.521284057))
        make_face(mode=Mode.SUBTRACT)
        with BuildLine():
            Line((-15.841102104, -17.478715943), (-15.841102104, -13.078715943))
            Line((-15.841102104, -13.078715943), (-20.241102104, -13.078715943))
            Line((-20.241102104, -13.078715943), (-20.241102104, -14.978715943))
            ThreePointArc((-20.241102104, -14.978715943), (-19.508869057, -16.746482896), (-17.741102104, -17.478715943))
            Line((-17.741102104, -17.478715943), (-15.841102104, -17.478715943))
        make_face(mode=Mode.SUBTRACT)
        with BuildLine():
            Line((14.158897896, -14.978715943), (14.158897896, -13.078715943))
            Line((14.158897896, -13.078715943), (9.758897896, -13.078715943))
            Line((9.758897896, -13.078715943), (9.758897896, -17.478715943))
            Line((9.758897896, -17.478715943), (11.658897896, -17.478715943))
            ThreePointArc((11.658897896, -17.478715943), (13.426664849, -16.746482896), (14.158897896, -14.978715943))
        make_face(mode=Mode.SUBTRACT)
    extrude(amount=BOSS_EXTRUDE1_DEPTH)


solid = part.part
